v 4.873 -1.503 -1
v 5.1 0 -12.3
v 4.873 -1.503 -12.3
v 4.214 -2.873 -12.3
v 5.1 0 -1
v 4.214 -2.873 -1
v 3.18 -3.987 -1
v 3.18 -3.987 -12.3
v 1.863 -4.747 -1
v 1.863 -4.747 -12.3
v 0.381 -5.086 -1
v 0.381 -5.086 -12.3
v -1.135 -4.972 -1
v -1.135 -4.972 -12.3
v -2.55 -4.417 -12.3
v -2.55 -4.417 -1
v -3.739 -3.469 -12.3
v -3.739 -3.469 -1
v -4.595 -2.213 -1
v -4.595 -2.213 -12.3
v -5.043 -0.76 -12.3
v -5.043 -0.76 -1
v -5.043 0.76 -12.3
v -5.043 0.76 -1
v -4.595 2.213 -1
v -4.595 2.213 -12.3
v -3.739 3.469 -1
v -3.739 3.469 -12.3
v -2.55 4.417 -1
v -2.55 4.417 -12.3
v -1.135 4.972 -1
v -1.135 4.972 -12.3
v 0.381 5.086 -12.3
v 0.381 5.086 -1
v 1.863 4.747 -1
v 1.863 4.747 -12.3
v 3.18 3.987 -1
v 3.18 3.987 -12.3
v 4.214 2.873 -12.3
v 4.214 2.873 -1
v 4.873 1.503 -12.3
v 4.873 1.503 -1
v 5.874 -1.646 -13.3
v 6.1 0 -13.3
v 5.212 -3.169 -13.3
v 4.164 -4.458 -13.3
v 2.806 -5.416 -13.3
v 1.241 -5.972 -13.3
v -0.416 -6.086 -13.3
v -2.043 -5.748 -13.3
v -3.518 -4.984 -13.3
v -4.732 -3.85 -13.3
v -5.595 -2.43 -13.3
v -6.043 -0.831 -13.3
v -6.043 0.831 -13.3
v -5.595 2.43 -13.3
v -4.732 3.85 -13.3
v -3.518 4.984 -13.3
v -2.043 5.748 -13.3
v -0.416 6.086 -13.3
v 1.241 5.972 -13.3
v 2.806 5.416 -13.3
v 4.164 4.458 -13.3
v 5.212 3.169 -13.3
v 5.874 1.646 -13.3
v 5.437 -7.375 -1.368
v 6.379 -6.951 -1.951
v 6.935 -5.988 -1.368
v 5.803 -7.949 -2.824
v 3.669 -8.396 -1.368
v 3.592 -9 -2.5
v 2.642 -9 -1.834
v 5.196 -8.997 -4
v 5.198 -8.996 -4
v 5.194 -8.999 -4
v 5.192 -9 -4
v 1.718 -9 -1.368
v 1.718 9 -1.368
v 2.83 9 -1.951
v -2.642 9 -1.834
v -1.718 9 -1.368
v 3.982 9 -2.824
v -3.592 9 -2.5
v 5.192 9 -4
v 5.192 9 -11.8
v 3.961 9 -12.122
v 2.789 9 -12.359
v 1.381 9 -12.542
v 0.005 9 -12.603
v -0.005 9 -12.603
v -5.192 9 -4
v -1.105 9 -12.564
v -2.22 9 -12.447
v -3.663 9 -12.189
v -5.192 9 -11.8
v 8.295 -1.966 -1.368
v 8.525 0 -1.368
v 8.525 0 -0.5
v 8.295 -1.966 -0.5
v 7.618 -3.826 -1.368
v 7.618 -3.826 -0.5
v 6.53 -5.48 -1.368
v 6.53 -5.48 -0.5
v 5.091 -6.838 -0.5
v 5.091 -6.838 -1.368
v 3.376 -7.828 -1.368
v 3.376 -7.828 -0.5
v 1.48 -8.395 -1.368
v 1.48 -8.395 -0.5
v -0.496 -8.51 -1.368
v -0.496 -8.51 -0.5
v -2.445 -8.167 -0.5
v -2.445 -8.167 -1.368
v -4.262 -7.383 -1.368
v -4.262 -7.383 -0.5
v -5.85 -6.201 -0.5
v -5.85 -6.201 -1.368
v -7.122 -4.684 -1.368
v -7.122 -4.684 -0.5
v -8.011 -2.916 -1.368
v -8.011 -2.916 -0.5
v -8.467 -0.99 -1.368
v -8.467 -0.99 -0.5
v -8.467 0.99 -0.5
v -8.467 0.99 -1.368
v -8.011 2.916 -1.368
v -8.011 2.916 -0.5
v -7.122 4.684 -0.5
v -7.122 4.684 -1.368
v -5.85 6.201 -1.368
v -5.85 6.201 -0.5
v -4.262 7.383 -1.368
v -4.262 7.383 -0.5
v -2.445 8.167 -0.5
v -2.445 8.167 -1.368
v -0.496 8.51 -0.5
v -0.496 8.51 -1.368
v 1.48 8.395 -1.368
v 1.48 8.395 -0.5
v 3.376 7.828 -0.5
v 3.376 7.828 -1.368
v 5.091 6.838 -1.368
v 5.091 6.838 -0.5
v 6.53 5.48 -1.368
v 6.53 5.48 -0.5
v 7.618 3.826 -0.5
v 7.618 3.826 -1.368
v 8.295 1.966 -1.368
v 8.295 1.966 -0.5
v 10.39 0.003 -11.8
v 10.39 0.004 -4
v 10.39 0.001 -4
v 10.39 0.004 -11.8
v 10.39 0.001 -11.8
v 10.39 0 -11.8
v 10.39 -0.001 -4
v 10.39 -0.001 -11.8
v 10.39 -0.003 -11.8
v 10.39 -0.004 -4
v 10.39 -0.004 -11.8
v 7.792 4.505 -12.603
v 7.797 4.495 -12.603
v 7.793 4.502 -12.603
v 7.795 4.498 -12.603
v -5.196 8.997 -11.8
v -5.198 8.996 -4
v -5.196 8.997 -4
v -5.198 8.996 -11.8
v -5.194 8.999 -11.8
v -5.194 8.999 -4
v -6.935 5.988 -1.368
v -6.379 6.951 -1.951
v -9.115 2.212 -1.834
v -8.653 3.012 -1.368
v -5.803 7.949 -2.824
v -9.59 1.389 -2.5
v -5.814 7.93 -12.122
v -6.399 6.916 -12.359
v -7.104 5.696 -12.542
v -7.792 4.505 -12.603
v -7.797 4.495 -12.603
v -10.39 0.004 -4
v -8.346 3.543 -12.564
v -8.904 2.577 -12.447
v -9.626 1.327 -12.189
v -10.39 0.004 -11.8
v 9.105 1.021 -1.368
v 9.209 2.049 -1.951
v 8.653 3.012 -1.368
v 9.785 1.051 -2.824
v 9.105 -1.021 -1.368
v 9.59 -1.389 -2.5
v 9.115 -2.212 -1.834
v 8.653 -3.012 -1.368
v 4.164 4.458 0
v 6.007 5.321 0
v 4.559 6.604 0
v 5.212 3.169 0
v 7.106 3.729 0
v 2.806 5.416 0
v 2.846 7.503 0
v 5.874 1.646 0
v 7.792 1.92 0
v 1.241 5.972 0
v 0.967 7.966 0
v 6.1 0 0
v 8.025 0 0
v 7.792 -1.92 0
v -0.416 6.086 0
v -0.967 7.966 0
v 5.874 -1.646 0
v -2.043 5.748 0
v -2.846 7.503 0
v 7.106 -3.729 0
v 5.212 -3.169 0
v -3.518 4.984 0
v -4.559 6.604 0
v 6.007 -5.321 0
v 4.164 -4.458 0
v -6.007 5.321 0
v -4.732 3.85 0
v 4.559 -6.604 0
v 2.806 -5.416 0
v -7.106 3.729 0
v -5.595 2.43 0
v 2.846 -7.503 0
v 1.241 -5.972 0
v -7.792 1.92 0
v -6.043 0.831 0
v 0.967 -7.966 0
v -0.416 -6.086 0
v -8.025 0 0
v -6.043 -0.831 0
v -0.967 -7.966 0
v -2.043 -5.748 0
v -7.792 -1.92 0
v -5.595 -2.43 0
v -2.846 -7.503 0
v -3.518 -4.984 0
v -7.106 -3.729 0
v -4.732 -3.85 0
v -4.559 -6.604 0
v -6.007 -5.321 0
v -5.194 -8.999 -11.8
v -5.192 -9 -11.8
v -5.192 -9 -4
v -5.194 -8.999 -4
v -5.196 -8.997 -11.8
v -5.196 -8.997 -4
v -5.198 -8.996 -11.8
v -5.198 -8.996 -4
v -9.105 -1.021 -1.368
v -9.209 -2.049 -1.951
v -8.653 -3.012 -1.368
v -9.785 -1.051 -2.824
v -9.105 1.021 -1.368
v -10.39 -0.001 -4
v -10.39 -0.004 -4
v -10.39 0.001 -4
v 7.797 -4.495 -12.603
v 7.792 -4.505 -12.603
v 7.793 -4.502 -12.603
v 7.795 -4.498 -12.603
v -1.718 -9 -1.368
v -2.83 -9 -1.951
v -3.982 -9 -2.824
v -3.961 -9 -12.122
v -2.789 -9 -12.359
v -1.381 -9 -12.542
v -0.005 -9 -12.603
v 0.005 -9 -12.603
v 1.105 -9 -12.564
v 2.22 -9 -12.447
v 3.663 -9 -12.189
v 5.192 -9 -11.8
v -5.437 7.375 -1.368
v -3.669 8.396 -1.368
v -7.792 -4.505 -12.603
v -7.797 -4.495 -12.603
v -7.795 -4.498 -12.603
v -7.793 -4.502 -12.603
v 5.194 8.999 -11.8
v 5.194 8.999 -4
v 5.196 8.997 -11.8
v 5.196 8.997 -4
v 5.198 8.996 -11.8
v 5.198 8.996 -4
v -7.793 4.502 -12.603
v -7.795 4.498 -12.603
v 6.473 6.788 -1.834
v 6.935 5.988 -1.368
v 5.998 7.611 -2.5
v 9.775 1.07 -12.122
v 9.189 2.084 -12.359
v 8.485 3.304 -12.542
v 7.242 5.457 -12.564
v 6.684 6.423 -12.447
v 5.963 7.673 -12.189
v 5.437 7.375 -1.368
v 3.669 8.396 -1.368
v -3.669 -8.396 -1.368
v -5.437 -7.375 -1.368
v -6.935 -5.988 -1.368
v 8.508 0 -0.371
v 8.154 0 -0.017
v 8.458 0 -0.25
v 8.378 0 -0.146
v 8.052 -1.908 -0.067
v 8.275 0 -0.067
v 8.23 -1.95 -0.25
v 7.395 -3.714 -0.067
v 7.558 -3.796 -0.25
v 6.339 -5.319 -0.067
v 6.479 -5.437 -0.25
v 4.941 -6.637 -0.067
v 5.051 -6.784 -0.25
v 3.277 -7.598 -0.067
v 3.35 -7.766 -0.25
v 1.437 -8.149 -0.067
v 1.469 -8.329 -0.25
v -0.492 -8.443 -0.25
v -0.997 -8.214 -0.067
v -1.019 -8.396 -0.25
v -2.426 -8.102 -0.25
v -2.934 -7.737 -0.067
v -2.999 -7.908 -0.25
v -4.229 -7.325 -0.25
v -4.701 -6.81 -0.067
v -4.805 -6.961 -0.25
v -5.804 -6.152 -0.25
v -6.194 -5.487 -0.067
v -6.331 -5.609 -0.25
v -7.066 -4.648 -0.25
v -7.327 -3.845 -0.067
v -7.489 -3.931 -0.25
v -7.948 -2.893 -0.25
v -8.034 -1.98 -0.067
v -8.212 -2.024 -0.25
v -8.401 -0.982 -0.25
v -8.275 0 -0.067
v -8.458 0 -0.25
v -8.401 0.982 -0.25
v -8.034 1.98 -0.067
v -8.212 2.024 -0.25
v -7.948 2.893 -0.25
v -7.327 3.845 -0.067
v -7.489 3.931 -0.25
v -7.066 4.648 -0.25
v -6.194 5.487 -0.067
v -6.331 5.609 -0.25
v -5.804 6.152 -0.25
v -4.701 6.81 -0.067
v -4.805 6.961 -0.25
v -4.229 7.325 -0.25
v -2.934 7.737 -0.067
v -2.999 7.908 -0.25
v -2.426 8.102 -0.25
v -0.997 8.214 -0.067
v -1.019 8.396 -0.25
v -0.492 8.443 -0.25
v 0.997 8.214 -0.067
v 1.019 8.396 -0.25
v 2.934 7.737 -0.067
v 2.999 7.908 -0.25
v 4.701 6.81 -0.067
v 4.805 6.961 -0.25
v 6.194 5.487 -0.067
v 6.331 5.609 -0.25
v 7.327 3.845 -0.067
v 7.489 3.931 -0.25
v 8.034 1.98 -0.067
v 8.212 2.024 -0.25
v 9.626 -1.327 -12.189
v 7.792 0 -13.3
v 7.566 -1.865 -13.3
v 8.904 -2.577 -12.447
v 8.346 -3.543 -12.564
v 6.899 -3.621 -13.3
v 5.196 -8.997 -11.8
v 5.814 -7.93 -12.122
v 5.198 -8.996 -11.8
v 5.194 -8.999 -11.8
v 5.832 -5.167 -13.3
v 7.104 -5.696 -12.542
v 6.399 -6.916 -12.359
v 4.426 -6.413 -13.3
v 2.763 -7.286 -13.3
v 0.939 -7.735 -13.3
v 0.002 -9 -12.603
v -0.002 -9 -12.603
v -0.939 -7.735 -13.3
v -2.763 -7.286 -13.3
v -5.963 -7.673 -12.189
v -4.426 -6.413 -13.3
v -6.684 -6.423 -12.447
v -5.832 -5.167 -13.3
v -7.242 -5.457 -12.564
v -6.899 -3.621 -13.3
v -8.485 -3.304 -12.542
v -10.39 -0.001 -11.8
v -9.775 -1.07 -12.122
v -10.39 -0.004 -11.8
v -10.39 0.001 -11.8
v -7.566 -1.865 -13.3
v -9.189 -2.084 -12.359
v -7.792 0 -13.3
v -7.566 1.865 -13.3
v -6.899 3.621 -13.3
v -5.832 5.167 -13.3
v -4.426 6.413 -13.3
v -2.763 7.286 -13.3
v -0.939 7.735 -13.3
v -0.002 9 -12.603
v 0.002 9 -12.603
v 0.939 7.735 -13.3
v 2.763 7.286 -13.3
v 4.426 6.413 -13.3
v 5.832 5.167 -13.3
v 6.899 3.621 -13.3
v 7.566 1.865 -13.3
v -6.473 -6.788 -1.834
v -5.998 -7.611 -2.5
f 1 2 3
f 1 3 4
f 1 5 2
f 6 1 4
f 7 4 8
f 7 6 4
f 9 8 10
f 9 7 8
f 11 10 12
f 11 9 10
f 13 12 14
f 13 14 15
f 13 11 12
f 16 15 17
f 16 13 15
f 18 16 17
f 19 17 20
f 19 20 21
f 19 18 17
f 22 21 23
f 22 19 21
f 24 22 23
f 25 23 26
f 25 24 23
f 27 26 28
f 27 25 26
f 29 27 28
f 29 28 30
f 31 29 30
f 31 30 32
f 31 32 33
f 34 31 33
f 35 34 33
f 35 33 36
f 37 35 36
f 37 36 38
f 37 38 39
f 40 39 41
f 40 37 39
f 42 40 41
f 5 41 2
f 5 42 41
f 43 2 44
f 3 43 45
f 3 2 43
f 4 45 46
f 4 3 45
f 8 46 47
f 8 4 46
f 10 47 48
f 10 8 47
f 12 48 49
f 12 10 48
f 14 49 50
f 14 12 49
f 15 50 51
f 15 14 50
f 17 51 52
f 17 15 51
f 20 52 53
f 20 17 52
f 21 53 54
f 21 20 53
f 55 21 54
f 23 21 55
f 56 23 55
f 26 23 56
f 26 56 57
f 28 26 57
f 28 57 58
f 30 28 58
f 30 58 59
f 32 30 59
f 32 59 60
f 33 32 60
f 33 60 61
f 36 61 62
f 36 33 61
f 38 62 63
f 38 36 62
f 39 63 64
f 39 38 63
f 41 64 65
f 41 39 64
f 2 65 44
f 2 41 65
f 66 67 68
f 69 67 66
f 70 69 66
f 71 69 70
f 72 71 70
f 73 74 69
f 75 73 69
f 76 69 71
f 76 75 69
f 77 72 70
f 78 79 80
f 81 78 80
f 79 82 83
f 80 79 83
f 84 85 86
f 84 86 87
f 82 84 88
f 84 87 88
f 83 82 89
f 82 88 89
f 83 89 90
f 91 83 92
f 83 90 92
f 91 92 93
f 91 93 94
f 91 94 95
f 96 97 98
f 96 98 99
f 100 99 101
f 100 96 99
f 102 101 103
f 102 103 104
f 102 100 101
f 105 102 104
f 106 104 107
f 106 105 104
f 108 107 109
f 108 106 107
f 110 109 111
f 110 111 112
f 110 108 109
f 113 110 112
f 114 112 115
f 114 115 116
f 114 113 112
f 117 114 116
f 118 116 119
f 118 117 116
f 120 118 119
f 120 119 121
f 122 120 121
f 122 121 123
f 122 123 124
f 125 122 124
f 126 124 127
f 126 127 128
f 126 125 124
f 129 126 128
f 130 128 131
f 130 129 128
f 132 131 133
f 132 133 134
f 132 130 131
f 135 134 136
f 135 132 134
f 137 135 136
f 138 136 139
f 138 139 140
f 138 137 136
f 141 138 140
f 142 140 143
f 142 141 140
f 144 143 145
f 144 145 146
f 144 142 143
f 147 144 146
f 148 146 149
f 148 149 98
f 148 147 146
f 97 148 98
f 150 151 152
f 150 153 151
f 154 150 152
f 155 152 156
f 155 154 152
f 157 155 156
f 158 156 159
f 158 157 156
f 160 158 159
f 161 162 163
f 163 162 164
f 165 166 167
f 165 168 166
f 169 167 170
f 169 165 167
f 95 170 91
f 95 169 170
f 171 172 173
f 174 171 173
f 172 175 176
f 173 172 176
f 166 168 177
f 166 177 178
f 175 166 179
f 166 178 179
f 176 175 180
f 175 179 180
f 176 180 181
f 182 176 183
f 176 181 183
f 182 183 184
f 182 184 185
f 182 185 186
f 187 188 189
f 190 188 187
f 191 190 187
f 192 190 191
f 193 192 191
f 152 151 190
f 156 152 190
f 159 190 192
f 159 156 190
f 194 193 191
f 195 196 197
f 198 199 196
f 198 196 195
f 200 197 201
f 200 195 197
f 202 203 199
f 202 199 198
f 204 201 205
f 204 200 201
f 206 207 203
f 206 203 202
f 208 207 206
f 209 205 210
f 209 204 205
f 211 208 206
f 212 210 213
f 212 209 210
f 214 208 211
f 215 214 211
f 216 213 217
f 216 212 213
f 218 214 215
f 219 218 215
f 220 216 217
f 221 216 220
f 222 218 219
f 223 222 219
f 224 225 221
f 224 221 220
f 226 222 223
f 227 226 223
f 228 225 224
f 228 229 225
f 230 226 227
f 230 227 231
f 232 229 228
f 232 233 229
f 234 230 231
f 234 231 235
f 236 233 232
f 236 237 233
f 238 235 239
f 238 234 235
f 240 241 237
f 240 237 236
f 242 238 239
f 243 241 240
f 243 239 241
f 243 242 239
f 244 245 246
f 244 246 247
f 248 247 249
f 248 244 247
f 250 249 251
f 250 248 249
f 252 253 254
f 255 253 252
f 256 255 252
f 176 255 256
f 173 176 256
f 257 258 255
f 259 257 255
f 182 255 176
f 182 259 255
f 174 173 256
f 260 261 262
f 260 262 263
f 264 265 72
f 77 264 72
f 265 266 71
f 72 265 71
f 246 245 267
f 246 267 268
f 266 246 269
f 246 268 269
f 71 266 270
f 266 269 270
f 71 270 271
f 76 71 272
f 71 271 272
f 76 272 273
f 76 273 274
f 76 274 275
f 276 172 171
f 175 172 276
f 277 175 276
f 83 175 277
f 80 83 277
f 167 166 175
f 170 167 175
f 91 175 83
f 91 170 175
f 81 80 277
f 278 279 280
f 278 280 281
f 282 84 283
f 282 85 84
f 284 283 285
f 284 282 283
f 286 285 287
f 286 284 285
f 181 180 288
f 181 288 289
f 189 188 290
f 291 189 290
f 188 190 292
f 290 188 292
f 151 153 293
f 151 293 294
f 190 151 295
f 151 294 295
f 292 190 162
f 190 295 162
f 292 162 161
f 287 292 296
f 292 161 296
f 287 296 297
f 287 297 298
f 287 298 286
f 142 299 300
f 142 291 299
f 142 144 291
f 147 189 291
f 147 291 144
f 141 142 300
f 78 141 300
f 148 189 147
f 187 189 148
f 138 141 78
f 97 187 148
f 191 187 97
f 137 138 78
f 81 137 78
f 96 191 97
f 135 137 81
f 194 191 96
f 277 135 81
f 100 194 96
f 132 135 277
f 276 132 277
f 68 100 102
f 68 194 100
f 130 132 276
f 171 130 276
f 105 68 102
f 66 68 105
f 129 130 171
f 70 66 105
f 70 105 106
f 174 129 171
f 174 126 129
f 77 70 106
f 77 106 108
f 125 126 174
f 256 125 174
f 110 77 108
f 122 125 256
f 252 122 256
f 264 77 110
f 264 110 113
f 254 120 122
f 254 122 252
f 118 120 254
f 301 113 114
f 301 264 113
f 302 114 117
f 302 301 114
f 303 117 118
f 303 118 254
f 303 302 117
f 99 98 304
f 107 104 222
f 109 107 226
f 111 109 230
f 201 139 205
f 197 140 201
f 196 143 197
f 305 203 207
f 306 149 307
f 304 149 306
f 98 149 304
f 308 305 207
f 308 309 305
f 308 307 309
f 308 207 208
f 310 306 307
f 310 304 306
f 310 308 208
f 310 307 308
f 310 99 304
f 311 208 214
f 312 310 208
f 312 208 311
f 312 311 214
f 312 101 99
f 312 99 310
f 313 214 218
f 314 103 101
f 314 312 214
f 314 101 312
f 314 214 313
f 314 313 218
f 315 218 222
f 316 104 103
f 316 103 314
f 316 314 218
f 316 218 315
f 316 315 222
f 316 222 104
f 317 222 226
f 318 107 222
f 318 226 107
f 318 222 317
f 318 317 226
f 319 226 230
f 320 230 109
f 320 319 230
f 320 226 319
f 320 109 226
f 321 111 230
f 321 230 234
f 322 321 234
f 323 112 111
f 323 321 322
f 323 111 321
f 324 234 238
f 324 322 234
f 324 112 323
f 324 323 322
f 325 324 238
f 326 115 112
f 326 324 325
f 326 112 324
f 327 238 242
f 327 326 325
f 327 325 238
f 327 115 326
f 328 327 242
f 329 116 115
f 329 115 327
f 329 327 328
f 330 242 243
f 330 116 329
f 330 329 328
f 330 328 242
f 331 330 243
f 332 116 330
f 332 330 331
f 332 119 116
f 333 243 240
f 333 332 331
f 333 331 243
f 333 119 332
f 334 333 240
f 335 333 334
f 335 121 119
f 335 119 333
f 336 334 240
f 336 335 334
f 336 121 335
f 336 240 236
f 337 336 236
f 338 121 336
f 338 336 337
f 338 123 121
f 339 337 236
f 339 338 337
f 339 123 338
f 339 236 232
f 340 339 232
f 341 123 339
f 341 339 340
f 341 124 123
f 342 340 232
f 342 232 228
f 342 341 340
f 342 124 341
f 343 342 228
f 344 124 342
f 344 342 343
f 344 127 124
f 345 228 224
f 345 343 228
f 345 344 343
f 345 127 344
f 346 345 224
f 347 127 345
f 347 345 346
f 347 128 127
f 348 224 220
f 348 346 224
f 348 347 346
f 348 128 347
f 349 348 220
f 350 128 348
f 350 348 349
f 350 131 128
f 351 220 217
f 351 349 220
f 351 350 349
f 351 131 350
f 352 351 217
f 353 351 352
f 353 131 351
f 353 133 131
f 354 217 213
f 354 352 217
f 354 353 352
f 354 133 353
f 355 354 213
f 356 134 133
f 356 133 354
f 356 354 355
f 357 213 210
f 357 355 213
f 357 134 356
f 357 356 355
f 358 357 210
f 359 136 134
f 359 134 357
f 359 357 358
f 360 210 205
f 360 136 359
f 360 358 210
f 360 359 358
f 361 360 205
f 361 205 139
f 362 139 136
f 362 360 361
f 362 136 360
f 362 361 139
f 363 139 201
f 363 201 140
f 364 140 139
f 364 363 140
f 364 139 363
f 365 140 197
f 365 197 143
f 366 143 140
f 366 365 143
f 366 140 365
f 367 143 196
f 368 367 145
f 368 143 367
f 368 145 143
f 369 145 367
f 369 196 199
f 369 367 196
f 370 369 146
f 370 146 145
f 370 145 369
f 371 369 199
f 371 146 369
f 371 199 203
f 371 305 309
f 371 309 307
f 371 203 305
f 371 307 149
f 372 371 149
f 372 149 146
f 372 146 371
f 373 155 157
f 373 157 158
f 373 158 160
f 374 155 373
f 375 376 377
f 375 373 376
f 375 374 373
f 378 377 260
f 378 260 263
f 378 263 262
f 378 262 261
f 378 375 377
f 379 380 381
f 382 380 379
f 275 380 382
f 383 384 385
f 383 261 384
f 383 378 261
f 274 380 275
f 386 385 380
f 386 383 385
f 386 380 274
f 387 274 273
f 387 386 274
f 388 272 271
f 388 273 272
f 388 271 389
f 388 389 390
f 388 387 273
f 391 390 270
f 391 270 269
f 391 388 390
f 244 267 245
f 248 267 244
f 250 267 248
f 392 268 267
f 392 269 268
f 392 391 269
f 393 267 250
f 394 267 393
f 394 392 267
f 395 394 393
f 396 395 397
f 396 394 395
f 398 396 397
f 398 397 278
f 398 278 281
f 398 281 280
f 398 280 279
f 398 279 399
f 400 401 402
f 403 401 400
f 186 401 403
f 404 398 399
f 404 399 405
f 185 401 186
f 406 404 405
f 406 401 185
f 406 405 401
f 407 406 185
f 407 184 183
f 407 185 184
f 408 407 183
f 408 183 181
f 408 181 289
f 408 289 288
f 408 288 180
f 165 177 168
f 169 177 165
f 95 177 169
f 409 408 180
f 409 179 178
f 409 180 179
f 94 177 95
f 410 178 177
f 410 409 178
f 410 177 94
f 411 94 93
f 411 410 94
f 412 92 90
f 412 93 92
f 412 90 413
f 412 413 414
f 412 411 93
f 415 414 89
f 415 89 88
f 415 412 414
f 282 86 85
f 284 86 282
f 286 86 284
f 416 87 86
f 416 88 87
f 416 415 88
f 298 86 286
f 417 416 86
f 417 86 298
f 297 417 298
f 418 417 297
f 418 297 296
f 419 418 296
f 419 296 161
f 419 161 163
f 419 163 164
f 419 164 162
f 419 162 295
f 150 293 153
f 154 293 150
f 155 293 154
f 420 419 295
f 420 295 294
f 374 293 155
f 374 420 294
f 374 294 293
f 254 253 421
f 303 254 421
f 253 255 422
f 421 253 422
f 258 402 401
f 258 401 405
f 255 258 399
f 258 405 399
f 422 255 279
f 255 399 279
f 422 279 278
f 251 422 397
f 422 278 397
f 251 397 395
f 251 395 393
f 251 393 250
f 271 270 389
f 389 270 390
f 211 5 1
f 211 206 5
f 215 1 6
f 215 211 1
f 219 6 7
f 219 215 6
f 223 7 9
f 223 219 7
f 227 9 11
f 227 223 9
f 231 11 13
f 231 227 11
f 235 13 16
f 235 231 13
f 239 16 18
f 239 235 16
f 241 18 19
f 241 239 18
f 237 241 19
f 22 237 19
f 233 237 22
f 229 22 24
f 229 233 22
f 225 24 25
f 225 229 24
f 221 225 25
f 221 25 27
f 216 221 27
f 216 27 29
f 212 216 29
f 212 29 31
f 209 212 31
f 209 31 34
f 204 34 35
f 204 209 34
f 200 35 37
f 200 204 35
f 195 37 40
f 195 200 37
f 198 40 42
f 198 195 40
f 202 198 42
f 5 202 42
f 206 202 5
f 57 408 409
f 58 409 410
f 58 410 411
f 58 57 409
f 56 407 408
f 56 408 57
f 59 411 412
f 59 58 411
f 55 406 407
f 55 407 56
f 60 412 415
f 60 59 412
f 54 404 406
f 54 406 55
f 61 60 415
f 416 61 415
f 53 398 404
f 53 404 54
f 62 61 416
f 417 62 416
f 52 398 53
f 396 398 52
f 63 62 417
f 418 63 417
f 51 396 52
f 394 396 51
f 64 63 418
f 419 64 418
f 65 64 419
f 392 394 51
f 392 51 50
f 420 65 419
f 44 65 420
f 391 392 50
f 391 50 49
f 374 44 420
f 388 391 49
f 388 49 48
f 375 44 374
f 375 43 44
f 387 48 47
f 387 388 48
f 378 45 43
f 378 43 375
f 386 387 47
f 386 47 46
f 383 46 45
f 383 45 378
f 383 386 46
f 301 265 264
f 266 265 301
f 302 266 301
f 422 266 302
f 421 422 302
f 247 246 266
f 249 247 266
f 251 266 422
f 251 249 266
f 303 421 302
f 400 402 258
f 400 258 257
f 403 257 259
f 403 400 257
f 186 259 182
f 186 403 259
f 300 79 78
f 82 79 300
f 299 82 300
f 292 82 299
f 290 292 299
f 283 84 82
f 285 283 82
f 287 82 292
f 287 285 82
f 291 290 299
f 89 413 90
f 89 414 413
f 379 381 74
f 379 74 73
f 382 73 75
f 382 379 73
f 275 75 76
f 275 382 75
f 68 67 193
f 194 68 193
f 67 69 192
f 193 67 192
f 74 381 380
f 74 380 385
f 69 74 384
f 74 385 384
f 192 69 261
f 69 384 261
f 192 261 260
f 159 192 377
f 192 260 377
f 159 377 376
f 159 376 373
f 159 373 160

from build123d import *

# Parameters (mm, degrees)
CUT_EXTRUDE1_START = -12.602516
SKETCH2_OUTSIDE_W  = 29.232
SKETCH2_OUTSIDE_H  = 29.232
CUT_EXTRUDE1_DEPTH = 11.234893
FILLET1_R          = 0.5


with BuildPart() as part:
    # Sketch1 → Revolve1 (revolve)
    with BuildSketch(Plane(origin=(0, 0, 0), x_dir=(0, 0, -1), z_dir=(1, 0, 0)), mode=Mode.PRIVATE) as revolve1_sk:
        Polygon((13.3, 7.791923789), (13.3, 6.1), (12.3, 5.1), (1, 5.1), (0, 6.1), (0, 8.524769367), (1.367623399, 8.524769367), (1.367623399, 9.162502632), (4, 10.39), (11.8, 10.39), align=None)
    revolve(revolve1_sk.sketch.rotate(Axis((0, 0, 0), (0, 0, -1)), 90), axis=Axis((0, 0, 0), (0, 0, -1)))

    # Sketch2 outside → Cut-Extrude1 (cut)
    with BuildSketch(Plane.XY.offset(CUT_EXTRUDE1_START)):
        Rectangle(SKETCH2_OUTSIDE_W, SKETCH2_OUTSIDE_H)
        Polygon((10.392304845, 0), (5.196152423, 9), (-5.196152423, 9), (-10.392304845, 0), (-5.196152423, -9), (5.196152423, -9), align=None, mode=Mode.SUBTRACT)
    extrude(amount=CUT_EXTRUDE1_DEPTH, mode=Mode.SUBTRACT)

    # Fillet1
    fillet1_edges = [part.edges().sort_by_distance(p)[0] for p in [
        (-8.524769367, 0, 0),
    ]]
    fillet(fillet1_edges, radius=FILLET1_R)


solid = part.part
